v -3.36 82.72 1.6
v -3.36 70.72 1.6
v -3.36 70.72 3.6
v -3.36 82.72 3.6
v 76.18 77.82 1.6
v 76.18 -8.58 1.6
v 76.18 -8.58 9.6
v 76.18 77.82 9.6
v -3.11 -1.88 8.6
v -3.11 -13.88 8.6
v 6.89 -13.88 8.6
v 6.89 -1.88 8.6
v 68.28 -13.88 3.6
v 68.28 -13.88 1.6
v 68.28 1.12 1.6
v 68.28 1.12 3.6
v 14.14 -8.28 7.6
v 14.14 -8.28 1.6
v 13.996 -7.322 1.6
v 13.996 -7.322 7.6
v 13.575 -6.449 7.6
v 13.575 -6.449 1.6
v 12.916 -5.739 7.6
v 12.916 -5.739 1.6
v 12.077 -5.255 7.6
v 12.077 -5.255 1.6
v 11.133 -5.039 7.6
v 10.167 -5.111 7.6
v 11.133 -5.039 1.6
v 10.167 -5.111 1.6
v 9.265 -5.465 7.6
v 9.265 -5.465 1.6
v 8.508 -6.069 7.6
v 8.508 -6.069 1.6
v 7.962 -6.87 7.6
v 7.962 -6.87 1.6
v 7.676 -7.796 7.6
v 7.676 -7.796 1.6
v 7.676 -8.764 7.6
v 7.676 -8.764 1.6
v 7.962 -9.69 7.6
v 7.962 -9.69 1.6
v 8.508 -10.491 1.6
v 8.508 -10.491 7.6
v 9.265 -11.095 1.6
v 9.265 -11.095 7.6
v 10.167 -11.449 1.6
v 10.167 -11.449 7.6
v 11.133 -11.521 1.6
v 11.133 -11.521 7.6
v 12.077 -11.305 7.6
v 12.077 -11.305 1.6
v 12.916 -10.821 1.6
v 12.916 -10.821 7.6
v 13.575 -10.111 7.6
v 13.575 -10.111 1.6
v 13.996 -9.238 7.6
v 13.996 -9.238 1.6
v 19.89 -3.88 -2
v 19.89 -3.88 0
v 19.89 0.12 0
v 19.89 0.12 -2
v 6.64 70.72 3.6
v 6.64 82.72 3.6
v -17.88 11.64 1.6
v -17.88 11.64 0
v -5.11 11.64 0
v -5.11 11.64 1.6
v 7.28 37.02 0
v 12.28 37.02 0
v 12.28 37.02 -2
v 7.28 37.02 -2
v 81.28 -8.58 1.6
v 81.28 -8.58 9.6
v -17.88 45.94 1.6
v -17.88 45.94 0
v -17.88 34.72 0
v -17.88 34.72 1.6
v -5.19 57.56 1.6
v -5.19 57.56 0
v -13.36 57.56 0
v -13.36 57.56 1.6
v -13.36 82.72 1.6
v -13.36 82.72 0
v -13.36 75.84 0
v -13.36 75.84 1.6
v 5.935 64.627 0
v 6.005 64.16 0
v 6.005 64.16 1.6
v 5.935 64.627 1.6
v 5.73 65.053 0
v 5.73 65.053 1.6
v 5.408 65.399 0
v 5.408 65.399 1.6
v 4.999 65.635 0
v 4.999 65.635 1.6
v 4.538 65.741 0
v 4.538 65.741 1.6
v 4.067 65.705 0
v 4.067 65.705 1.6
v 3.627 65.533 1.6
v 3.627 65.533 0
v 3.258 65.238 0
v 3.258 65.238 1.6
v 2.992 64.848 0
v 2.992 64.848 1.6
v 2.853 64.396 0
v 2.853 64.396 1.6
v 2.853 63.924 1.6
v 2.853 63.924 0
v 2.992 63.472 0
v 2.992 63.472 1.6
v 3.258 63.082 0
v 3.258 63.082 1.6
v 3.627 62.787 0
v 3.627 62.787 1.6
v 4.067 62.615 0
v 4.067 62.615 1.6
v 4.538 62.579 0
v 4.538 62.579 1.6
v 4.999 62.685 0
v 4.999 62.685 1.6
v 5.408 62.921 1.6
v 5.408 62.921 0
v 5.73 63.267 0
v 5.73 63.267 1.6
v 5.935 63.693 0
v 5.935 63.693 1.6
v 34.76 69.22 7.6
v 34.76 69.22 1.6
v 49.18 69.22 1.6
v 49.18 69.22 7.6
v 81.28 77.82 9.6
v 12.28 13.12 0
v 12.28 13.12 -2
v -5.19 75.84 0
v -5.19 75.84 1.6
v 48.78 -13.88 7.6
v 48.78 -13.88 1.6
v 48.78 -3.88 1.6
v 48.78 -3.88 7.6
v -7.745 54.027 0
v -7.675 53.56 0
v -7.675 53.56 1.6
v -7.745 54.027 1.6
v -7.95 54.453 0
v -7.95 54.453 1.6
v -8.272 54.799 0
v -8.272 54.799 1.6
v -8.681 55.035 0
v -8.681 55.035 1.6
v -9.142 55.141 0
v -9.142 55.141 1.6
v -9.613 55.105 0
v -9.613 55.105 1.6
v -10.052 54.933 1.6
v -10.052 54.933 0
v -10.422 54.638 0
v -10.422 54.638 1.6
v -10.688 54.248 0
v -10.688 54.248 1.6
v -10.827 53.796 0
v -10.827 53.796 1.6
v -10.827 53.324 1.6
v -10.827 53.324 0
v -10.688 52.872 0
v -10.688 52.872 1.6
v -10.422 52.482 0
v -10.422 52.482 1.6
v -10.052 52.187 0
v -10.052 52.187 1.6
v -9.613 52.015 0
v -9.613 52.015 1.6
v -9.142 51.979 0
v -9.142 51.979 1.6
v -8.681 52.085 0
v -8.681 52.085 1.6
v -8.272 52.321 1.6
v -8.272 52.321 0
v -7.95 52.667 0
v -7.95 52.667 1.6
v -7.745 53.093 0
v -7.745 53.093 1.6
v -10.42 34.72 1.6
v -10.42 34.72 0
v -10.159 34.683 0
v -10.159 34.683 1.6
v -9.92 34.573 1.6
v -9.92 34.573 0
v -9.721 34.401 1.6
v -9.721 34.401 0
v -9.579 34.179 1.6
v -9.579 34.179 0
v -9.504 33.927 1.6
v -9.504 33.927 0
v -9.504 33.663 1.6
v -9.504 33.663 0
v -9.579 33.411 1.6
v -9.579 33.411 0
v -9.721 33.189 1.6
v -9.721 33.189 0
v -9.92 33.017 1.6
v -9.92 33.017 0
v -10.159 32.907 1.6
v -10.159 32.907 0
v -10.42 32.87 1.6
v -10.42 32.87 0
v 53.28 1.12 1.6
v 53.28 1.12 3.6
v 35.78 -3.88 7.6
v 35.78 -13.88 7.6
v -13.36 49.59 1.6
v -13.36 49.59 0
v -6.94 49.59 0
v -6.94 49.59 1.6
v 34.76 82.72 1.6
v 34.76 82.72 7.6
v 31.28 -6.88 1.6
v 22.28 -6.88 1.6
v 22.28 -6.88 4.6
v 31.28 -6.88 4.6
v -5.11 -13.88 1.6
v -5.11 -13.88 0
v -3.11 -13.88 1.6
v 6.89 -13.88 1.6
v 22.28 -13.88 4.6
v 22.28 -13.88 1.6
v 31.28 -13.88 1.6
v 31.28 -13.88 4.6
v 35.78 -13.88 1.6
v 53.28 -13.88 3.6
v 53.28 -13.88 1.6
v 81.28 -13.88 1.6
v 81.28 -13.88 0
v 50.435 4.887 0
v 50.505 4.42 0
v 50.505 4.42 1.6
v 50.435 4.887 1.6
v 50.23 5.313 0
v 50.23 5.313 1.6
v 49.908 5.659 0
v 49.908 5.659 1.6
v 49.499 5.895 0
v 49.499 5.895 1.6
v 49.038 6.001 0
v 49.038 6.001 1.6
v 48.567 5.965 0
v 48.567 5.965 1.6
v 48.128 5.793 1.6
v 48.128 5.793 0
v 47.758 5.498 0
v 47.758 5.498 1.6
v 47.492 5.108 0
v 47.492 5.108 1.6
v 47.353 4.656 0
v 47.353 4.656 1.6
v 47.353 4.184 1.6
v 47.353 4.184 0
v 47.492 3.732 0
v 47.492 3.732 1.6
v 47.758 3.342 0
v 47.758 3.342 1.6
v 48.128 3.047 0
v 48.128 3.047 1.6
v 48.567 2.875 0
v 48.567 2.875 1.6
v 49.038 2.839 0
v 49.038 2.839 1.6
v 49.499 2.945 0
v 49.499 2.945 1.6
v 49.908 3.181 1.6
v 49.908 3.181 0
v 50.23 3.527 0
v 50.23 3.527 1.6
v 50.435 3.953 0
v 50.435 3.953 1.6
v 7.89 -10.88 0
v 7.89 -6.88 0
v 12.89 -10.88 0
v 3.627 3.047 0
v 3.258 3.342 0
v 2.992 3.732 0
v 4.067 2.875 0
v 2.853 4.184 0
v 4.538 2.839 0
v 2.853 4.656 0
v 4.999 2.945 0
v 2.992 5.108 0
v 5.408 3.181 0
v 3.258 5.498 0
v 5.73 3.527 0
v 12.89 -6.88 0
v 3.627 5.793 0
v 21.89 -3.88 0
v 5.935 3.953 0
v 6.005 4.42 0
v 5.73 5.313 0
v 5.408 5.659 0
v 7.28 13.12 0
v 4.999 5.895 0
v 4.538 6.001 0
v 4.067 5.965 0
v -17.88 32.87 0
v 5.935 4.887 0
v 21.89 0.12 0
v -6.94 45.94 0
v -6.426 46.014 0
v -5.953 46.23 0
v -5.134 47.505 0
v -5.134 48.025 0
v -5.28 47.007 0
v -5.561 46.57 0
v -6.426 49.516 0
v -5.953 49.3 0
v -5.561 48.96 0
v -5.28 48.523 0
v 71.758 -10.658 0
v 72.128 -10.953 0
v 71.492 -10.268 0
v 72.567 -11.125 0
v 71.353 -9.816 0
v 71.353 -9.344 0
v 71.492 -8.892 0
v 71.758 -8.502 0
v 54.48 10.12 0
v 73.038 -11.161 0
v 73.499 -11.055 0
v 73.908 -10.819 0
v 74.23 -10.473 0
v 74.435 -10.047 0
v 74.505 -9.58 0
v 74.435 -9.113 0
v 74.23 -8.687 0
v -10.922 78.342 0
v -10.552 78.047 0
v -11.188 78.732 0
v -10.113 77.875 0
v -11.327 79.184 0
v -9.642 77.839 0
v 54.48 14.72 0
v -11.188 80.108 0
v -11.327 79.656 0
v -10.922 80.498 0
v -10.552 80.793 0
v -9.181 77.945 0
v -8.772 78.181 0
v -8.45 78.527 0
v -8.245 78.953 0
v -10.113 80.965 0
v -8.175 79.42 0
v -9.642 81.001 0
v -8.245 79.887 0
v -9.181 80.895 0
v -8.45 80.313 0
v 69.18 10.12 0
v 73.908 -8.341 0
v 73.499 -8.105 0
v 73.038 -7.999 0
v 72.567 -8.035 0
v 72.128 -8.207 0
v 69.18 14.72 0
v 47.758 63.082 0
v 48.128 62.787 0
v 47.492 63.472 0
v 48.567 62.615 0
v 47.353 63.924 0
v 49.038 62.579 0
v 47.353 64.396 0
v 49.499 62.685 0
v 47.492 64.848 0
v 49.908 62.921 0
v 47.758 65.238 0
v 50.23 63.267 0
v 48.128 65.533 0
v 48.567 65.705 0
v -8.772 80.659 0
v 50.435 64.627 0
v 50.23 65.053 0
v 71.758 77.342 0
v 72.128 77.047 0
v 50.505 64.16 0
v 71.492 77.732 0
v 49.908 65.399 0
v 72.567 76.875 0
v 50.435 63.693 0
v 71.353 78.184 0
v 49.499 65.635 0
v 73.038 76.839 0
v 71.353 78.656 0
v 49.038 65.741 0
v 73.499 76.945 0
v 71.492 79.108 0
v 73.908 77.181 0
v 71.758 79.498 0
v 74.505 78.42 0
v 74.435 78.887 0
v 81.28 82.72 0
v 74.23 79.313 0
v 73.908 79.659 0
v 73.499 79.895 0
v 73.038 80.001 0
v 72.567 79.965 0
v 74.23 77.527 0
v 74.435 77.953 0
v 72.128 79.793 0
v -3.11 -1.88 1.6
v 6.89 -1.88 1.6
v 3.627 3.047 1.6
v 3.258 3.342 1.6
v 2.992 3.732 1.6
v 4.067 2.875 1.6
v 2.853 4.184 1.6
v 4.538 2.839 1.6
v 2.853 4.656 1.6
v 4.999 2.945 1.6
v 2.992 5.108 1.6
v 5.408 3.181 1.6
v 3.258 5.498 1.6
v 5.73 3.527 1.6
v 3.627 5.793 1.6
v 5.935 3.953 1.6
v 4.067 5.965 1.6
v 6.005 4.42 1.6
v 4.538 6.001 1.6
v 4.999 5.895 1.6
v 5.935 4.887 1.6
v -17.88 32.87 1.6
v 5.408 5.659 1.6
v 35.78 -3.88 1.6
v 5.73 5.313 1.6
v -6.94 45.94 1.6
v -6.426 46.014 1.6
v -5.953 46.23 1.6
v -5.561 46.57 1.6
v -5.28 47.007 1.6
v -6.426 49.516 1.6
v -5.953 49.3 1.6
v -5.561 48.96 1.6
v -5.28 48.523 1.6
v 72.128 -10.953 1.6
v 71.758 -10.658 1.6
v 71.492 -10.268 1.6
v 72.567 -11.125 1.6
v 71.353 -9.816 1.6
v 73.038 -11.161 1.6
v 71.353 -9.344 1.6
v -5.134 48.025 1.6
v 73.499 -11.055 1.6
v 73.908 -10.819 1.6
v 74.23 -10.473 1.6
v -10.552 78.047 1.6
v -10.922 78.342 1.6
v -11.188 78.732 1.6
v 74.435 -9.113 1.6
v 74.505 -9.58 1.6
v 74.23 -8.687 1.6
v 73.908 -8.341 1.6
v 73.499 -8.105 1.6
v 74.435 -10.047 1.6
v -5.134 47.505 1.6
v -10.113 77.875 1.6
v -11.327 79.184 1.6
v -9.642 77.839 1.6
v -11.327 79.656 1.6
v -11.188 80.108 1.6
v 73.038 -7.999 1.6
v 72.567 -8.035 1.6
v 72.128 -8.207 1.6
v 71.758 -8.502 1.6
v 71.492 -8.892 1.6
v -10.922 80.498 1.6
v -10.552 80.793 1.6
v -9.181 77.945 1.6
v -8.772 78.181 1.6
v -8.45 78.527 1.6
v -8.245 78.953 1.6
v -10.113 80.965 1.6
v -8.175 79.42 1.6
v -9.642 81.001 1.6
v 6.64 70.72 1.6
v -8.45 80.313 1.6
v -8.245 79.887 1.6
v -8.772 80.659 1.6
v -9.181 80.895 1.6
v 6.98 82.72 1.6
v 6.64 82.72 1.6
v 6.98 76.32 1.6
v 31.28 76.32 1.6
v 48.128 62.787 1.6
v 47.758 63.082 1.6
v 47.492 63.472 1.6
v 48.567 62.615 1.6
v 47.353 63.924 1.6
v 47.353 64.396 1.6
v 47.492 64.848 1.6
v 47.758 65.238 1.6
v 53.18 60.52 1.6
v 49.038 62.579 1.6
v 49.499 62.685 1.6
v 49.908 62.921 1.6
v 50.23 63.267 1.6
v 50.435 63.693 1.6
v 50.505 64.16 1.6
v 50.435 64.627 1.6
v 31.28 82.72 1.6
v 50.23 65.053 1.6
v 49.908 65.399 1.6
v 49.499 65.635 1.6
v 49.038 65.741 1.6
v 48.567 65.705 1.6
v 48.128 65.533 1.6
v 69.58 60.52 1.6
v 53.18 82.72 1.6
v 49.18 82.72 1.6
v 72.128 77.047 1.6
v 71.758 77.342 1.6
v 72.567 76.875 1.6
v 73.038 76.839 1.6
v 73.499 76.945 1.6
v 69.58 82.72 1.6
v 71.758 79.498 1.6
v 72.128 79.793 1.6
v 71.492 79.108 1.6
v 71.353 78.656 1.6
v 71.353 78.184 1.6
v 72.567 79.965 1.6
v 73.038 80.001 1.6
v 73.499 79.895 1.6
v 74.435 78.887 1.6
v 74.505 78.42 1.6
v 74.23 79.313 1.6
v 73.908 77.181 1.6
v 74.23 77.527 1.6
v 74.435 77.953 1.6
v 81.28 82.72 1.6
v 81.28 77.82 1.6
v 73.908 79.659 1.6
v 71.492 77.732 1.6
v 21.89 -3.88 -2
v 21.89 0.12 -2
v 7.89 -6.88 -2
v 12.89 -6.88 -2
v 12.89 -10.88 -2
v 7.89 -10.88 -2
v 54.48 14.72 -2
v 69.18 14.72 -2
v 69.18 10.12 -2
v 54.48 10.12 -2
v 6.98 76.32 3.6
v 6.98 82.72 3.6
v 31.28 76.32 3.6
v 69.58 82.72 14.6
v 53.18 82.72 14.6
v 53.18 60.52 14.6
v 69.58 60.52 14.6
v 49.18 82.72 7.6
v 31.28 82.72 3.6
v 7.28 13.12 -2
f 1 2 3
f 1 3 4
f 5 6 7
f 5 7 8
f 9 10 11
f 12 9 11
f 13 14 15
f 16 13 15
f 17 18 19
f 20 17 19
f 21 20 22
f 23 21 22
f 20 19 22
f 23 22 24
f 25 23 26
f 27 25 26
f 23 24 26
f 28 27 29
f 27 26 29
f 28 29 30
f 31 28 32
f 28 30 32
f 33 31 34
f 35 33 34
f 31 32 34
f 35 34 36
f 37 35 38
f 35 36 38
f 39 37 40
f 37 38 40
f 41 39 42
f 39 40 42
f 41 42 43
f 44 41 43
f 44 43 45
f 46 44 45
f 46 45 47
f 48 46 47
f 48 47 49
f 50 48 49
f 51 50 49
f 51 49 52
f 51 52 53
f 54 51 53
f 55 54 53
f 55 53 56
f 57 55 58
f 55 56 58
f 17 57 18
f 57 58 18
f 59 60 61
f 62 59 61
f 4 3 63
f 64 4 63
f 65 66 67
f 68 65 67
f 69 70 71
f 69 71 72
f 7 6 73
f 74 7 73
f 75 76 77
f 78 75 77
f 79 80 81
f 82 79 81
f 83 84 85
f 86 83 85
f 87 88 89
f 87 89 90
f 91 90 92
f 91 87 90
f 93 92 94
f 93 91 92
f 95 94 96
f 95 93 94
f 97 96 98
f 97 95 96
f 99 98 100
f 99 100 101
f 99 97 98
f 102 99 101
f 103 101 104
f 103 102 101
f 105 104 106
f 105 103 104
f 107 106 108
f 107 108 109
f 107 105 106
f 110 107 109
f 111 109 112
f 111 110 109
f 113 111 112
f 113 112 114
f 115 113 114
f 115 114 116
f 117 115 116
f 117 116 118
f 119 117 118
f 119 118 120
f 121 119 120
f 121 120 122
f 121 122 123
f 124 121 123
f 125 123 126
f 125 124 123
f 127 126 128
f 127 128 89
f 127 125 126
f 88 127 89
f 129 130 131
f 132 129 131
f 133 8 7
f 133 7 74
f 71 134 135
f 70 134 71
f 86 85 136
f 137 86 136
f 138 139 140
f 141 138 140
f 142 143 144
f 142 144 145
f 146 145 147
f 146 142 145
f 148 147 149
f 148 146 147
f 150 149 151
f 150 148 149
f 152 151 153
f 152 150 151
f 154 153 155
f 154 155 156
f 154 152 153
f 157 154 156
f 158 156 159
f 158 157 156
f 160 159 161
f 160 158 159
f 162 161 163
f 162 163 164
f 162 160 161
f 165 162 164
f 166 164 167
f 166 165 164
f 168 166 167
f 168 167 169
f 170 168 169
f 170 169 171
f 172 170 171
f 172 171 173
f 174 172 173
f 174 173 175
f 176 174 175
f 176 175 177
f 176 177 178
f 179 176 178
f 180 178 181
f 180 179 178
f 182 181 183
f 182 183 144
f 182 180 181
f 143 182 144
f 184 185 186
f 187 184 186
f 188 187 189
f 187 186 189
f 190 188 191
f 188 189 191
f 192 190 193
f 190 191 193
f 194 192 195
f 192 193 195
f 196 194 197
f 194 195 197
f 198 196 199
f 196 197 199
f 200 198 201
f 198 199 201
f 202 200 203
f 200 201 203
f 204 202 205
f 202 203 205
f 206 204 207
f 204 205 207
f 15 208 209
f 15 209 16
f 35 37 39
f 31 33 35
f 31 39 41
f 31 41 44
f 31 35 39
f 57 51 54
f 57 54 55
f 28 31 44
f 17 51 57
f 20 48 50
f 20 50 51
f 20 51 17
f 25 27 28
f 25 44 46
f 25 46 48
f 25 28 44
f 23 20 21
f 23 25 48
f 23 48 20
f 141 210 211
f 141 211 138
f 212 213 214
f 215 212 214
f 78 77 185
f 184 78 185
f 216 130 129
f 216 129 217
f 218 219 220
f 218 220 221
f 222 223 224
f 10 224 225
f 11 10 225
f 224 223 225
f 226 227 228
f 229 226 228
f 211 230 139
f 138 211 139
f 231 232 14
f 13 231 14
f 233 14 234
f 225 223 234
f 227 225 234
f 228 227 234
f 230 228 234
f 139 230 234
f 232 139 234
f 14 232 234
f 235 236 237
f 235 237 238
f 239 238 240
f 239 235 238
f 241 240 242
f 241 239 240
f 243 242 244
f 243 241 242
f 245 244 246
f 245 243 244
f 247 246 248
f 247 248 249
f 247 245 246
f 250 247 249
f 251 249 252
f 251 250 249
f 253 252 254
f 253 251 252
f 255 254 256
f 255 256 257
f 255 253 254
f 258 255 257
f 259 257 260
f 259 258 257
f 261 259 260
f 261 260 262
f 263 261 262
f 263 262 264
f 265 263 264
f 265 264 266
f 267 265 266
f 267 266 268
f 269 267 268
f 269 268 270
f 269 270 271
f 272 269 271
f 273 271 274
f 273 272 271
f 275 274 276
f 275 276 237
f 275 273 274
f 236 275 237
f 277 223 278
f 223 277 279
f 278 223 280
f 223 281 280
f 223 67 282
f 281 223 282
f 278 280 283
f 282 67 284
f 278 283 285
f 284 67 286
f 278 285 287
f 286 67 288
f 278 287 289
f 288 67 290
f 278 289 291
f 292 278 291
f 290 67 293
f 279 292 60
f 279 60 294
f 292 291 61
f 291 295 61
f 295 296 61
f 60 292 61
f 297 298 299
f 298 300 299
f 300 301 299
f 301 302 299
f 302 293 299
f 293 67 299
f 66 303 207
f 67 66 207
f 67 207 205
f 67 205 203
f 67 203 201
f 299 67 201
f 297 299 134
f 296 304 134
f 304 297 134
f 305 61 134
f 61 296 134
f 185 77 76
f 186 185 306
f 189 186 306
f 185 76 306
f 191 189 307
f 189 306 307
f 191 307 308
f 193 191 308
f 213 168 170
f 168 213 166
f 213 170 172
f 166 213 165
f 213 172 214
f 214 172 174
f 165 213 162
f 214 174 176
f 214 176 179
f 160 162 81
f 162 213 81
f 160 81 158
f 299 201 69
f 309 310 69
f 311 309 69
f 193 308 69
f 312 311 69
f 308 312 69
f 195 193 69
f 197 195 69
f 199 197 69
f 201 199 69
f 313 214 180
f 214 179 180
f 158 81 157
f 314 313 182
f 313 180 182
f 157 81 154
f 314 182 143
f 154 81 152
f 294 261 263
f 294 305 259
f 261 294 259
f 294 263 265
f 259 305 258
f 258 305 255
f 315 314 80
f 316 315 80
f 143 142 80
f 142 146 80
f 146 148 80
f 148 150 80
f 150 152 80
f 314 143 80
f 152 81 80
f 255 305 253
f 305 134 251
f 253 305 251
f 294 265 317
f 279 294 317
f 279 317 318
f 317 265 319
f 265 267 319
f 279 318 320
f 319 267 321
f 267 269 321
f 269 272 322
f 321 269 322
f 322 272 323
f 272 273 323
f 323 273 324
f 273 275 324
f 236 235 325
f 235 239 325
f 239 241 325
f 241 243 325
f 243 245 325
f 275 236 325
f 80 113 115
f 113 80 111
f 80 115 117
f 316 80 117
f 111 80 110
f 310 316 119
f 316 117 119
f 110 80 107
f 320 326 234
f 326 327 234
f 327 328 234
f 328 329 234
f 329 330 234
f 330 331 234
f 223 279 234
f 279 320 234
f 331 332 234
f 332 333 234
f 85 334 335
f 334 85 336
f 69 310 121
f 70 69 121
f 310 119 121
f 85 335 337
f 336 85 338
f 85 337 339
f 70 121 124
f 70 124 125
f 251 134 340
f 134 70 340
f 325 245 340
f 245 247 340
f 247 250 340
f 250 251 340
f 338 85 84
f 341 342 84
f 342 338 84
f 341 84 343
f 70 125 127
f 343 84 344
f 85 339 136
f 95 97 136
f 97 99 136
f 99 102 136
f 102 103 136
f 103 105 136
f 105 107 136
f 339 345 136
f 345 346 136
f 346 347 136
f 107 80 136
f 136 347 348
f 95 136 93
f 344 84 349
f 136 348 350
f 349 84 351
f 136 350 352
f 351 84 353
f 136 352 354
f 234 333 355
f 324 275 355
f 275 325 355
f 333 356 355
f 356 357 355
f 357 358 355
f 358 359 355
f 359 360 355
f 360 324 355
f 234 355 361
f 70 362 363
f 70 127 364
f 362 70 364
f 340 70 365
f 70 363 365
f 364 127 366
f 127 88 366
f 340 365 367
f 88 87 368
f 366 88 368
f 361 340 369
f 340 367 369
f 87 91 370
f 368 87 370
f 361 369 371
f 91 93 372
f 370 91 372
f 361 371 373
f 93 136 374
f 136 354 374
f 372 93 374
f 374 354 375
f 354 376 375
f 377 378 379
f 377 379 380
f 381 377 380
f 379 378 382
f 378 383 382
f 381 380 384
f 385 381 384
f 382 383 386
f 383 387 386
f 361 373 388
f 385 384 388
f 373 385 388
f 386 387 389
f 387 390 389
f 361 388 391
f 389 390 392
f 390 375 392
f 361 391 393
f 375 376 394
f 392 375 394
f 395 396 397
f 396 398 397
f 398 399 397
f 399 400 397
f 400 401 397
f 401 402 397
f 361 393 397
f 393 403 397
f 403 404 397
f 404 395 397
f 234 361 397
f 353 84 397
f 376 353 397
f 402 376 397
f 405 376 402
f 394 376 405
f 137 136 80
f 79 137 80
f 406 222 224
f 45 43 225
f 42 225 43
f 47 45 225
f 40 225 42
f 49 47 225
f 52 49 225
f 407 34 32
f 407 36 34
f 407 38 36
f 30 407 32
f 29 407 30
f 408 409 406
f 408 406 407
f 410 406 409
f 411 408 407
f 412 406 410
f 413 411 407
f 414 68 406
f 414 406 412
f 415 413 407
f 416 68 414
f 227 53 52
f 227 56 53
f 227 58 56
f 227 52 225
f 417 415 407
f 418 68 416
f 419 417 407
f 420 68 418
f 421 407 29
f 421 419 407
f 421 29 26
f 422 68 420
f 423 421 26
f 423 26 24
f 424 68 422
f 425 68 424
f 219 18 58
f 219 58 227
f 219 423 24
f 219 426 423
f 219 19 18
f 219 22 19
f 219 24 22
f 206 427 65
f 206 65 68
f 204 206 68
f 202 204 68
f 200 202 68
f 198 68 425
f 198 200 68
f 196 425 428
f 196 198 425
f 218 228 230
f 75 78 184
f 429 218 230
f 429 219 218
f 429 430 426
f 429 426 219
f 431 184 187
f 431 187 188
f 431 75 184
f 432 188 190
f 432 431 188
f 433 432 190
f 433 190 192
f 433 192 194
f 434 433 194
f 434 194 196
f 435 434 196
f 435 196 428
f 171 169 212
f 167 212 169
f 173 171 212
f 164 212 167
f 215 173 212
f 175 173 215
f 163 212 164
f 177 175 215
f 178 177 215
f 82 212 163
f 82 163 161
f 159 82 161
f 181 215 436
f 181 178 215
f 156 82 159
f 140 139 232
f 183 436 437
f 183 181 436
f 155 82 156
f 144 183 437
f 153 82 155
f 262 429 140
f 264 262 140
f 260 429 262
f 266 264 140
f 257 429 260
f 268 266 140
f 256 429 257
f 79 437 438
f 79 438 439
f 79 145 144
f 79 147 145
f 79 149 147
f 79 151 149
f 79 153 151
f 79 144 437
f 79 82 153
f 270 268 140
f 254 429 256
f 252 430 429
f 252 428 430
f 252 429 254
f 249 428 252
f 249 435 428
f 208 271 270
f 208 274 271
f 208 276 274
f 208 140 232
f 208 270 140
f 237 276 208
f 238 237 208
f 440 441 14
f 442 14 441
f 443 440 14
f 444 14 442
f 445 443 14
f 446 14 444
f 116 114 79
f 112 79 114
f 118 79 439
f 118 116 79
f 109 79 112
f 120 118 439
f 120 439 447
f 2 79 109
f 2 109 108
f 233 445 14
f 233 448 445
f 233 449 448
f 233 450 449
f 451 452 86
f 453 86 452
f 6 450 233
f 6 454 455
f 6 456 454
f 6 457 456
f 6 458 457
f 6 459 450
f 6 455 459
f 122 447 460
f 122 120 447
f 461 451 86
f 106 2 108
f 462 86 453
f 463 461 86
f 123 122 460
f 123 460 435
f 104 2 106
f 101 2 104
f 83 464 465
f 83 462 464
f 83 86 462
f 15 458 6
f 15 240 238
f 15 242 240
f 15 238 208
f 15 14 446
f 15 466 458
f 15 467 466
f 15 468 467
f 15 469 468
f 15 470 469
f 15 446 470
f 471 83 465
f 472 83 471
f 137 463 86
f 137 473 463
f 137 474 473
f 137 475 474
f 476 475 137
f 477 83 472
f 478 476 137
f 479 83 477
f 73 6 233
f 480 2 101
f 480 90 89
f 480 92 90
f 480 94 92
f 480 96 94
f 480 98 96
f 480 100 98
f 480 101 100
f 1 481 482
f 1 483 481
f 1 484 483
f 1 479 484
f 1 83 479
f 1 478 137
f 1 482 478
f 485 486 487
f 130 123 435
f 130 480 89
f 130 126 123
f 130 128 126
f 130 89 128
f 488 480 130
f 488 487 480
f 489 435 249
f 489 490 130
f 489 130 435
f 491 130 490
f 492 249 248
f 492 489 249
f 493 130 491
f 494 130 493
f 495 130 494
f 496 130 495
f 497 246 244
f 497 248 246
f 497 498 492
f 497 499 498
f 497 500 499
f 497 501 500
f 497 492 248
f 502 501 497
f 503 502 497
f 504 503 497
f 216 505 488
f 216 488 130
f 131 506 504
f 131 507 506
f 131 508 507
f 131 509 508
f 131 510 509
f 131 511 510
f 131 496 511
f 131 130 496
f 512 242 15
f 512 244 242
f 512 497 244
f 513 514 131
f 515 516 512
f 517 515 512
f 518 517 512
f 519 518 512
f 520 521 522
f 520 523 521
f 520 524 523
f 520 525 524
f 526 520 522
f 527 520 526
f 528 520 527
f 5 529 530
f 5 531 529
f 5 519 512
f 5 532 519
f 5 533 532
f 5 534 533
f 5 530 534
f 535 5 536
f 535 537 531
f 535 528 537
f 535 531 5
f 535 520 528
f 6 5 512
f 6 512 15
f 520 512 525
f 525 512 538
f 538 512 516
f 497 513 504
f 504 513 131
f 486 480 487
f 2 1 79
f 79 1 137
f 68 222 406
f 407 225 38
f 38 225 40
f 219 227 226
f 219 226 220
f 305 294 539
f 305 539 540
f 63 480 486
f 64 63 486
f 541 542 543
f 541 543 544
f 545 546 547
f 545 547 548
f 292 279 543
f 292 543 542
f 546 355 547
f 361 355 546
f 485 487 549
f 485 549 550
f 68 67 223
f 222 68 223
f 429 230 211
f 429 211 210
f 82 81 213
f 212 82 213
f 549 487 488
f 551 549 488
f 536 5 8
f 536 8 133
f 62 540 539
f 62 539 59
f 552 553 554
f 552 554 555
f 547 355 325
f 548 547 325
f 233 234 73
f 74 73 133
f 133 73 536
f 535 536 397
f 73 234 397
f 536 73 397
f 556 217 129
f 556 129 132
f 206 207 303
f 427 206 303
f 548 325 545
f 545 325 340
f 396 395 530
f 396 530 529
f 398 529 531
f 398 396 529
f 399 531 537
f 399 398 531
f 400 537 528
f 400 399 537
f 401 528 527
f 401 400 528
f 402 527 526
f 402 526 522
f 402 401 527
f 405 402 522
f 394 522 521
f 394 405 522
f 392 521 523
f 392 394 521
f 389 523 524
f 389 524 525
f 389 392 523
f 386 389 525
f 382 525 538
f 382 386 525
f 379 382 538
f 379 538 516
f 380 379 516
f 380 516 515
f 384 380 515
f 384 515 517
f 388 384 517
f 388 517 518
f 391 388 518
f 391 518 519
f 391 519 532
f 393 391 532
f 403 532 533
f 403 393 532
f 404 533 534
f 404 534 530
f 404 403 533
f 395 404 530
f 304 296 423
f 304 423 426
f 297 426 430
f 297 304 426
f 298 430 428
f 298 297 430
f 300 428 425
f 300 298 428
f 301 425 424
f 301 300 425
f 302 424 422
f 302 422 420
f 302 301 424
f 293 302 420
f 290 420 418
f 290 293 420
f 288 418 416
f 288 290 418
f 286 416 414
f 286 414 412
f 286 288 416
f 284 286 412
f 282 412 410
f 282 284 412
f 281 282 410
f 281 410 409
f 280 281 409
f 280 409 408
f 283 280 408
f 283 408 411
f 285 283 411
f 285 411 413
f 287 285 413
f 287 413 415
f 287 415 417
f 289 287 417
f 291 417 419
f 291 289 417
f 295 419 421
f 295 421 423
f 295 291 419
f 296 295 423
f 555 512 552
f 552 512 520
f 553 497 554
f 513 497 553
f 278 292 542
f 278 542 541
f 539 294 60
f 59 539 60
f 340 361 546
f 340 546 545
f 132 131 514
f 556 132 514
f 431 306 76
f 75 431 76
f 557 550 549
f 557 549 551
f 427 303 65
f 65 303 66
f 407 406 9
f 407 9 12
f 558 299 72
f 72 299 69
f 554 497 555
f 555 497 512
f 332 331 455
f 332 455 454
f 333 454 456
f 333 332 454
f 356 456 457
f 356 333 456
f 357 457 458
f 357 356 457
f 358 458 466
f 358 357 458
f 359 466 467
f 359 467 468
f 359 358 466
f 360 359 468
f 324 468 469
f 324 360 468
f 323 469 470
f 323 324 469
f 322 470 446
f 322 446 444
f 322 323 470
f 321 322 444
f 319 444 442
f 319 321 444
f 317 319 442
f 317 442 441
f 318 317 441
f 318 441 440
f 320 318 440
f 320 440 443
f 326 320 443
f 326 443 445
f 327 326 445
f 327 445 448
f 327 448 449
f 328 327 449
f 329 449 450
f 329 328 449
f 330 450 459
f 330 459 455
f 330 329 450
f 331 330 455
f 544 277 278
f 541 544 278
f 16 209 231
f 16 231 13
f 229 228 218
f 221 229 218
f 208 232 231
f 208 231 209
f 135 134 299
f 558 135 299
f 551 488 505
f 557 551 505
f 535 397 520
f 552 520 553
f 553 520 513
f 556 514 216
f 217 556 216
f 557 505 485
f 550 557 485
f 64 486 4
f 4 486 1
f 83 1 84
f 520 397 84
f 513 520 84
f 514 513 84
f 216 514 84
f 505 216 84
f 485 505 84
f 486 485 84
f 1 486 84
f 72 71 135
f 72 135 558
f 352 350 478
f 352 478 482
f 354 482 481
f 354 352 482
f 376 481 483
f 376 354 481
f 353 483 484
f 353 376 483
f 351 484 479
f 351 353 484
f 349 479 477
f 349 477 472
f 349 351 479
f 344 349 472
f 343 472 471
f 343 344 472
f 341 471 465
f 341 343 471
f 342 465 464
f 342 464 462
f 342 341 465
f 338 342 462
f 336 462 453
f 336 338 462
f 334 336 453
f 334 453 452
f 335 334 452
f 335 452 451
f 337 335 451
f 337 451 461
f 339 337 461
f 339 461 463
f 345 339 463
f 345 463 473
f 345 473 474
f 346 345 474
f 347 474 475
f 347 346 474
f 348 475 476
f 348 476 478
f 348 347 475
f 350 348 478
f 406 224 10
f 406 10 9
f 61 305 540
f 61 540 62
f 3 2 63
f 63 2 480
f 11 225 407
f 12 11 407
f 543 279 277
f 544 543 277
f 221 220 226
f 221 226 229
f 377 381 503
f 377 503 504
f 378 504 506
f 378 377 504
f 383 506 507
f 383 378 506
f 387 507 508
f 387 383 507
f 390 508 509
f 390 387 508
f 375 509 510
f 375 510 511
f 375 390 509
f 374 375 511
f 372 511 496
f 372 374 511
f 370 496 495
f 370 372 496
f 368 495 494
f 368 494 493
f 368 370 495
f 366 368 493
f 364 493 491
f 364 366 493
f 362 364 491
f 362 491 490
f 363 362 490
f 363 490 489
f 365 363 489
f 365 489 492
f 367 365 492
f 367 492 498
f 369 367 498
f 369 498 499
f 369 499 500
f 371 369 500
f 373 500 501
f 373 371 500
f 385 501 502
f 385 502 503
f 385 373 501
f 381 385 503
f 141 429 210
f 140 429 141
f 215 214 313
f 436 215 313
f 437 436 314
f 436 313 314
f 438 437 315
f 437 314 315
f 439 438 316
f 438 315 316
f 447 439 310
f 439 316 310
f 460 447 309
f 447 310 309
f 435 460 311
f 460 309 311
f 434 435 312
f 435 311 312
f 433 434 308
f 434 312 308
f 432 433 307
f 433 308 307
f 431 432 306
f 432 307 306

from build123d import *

# Parameters (mm, degrees)
SKETCH_1_R       = 1.585
EXTRUDE_1_DEPTH  = 1.6
SKETCH_2_W       = 5.1
SKETCH_2_H       = 86.4
EXTRUDE_2_DEPTH  = 8
SKETCH_3_W       = 16.4
SKETCH_3_H       = 22.2
EXTRUDE_3_DEPTH  = 13
SKETCH_4_W       = 14.42
SKETCH_4_H       = 13.5
EXTRUDE_4_DEPTH  = 6
SKETCH_5_W       = 24.3
SKETCH_5_H       = 6.4
EXTRUDE_5_DEPTH  = 2
SKETCH_6_W       = 10
SKETCH_6_H       = 12
EXTRUDE_6_DEPTH  = 2
SKETCH_7_W       = 15
SKETCH_7_H       = 15
EXTRUDE_7_DEPTH  = 2
SKETCH_8_W       = 13
SKETCH_8_H       = 10
EXTRUDE_8_DEPTH  = 6
SKETCH_9_W       = 9
SKETCH_9_H       = 7
EXTRUDE_9_DEPTH  = 3
SKETCH_10_W      = 10
SKETCH_10_H      = 12
EXTRUDE_10_DEPTH = 7
SKETCH_11_R      = 3.25
EXTRUDE_11_DEPTH = 6
SKETCH_12_W      = 14.7
SKETCH_12_H      = 4.6
SKETCH_12_W_2    = 5
SKETCH_12_H_2    = 23.9
EXTRUDE_12_DEPTH = 2
SKETCH_14_W      = 5
SKETCH_14_H      = 4
SKETCH_14_W_2    = 2
EXTRUDE_13_DEPTH = 2


with BuildPart() as part:
    # 草图1 → 凸台-拉伸1 (new body)
    with BuildSketch(Plane.XY):
        with BuildLine():
            Line((81.28, 82.72), (-13.36, 82.72))
            Line((-13.36, 82.72), (-13.36, 75.84))
            Line((-13.36, 75.84), (-5.19, 75.84))
            Line((-5.19, 75.84), (-5.19, 57.56))
            Line((-5.19, 57.56), (-13.36, 57.56))
            Line((-13.36, 57.56), (-13.36, 49.59))
            Line((-13.36, 49.59), (-6.94, 49.59))
            ThreePointArc((-6.94, 49.59), (-5.115, 47.765), (-6.94, 45.94))
            Line((-6.94, 45.94), (-17.88, 45.94))
            Line((-17.88, 45.94), (-17.88, 34.72))
            Line((-17.88, 34.72), (-10.42, 34.72))
            ThreePointArc((-10.42, 34.72), (-9.495, 33.795), (-10.42, 32.87))
            Line((-10.42, 32.87), (-17.88, 32.87))
            Line((-17.88, 32.87), (-17.88, 11.64))
            Line((-17.88, 11.64), (-5.11, 11.64))
            Line((-5.11, 11.64), (-5.11, -13.88))
            Line((-5.11, -13.88), (81.28, -13.88))
            Line((81.28, -13.88), (81.28, 82.72))
        make_face()
        with Locations((48.92, 64.16)):
            Circle(SKETCH_1_R, mode=Mode.SUBTRACT)
        with Locations((4.42, 64.16)):
            Circle(SKETCH_1_R, mode=Mode.SUBTRACT)
        with Locations((4.42, 4.42)):
            Circle(SKETCH_1_R, mode=Mode.SUBTRACT)
        with Locations((48.92, 4.42)):
            Circle(SKETCH_1_R, mode=Mode.SUBTRACT)
        with Locations((72.92, -9.58)):
            Circle(SKETCH_1_R, mode=Mode.SUBTRACT)
        with Locations((72.92, 78.42)):
            Circle(SKETCH_1_R, mode=Mode.SUBTRACT)
        with Locations((-9.76, 79.42)):
            Circle(SKETCH_1_R, mode=Mode.SUBTRACT)
        with Locations((-9.26, 53.56)):
            Circle(SKETCH_1_R, mode=Mode.SUBTRACT)
    extrude(amount=EXTRUDE_1_DEPTH)

    # 草图2 → 凸台-拉伸2 (add)
    with BuildSketch(Plane.XY.offset(1.6)):
        with Locations((78.73, 34.62)):
            Rectangle(SKETCH_2_W, SKETCH_2_H)
    extrude(amount=EXTRUDE_2_DEPTH)

    # 草图3 → 凸台-拉伸3 (add)
    with BuildSketch(Plane.XY.offset(1.6)):
        with Locations((61.38, 71.62)):
            Rectangle(SKETCH_3_W, SKETCH_3_H)
    extrude(amount=EXTRUDE_3_DEPTH)

    # 草图4 → 凸台-拉伸4 (add)
    with BuildSketch(Plane.XY.offset(1.6)):
        with Locations((41.97, 75.97)):
            Rectangle(SKETCH_4_W, SKETCH_4_H)
    extrude(amount=EXTRUDE_4_DEPTH)

    # 草图5 → 凸台-拉伸5 (add)
    with BuildSketch(Plane.XY.offset(1.6)):
        with Locations((19.13, 79.52)):
            Rectangle(SKETCH_5_W, SKETCH_5_H)
    extrude(amount=EXTRUDE_5_DEPTH)

    # 草图6 → 凸台-拉伸6 (add)
    with BuildSketch(Plane.XY.offset(1.6)):
        with Locations((1.64, 76.72)):
            Rectangle(SKETCH_6_W, SKETCH_6_H)
    extrude(amount=EXTRUDE_6_DEPTH)

    # 草图7 → 凸台-拉伸7 (add)
    with BuildSketch(Plane.XY.offset(1.6)):
        with Locations((60.78, -6.38)):
            Rectangle(SKETCH_7_W, SKETCH_7_H)
    extrude(amount=EXTRUDE_7_DEPTH)

    # 草图8 → 凸台-拉伸8 (add)
    with BuildSketch(Plane.XY.offset(1.6)):
        with Locations((42.28, -8.88)):
            Rectangle(SKETCH_8_W, SKETCH_8_H)
    extrude(amount=EXTRUDE_8_DEPTH)

    # 草图9 → 凸台-拉伸9 (add)
    with BuildSketch(Plane.XY.offset(1.6)):
        with Locations((26.78, -10.38)):
            Rectangle(SKETCH_9_W, SKETCH_9_H)
    extrude(amount=EXTRUDE_9_DEPTH)

    # 草图10 → 凸台-拉伸10 (add)
    with BuildSketch(Plane.XY.offset(1.6)):
        with Locations((1.89, -7.88)):
            Rectangle(SKETCH_10_W, SKETCH_10_H)
    extrude(amount=EXTRUDE_10_DEPTH)

    # 草图11 → 凸台-拉伸11 (add)
    with BuildSketch(Plane.XY.offset(1.6)):
        with Locations((10.89, -8.28)):
            Circle(SKETCH_11_R)
    extrude(amount=EXTRUDE_11_DEPTH)

    # 草图12 → 凸台-拉伸12 (add)
    with BuildSketch(Plane(origin=(0, 0, 0), x_dir=(-1, 0, 0), z_dir=(0, 0, -1))):
        with Locations((-61.83, 12.42)):
            Rectangle(SKETCH_12_W, SKETCH_12_H)
        with Locations((-9.78, 25.07)):
            Rectangle(SKETCH_12_W_2, SKETCH_12_H_2)
    extrude(amount=EXTRUDE_12_DEPTH)

    # 草图14 → 凸台-拉伸13 (add)
    with BuildSketch(Plane(origin=(0, 0, 0), x_dir=(-1, 0, 0), z_dir=(0, 0, -1))):
        with Locations((-10.39, -8.88)):
            Rectangle(SKETCH_14_W, SKETCH_14_H)
        with Locations((-20.89, -1.88)):
            Rectangle(SKETCH_14_W_2, SKETCH_14_H)
    extrude(amount=EXTRUDE_13_DEPTH)


solid = part.part
